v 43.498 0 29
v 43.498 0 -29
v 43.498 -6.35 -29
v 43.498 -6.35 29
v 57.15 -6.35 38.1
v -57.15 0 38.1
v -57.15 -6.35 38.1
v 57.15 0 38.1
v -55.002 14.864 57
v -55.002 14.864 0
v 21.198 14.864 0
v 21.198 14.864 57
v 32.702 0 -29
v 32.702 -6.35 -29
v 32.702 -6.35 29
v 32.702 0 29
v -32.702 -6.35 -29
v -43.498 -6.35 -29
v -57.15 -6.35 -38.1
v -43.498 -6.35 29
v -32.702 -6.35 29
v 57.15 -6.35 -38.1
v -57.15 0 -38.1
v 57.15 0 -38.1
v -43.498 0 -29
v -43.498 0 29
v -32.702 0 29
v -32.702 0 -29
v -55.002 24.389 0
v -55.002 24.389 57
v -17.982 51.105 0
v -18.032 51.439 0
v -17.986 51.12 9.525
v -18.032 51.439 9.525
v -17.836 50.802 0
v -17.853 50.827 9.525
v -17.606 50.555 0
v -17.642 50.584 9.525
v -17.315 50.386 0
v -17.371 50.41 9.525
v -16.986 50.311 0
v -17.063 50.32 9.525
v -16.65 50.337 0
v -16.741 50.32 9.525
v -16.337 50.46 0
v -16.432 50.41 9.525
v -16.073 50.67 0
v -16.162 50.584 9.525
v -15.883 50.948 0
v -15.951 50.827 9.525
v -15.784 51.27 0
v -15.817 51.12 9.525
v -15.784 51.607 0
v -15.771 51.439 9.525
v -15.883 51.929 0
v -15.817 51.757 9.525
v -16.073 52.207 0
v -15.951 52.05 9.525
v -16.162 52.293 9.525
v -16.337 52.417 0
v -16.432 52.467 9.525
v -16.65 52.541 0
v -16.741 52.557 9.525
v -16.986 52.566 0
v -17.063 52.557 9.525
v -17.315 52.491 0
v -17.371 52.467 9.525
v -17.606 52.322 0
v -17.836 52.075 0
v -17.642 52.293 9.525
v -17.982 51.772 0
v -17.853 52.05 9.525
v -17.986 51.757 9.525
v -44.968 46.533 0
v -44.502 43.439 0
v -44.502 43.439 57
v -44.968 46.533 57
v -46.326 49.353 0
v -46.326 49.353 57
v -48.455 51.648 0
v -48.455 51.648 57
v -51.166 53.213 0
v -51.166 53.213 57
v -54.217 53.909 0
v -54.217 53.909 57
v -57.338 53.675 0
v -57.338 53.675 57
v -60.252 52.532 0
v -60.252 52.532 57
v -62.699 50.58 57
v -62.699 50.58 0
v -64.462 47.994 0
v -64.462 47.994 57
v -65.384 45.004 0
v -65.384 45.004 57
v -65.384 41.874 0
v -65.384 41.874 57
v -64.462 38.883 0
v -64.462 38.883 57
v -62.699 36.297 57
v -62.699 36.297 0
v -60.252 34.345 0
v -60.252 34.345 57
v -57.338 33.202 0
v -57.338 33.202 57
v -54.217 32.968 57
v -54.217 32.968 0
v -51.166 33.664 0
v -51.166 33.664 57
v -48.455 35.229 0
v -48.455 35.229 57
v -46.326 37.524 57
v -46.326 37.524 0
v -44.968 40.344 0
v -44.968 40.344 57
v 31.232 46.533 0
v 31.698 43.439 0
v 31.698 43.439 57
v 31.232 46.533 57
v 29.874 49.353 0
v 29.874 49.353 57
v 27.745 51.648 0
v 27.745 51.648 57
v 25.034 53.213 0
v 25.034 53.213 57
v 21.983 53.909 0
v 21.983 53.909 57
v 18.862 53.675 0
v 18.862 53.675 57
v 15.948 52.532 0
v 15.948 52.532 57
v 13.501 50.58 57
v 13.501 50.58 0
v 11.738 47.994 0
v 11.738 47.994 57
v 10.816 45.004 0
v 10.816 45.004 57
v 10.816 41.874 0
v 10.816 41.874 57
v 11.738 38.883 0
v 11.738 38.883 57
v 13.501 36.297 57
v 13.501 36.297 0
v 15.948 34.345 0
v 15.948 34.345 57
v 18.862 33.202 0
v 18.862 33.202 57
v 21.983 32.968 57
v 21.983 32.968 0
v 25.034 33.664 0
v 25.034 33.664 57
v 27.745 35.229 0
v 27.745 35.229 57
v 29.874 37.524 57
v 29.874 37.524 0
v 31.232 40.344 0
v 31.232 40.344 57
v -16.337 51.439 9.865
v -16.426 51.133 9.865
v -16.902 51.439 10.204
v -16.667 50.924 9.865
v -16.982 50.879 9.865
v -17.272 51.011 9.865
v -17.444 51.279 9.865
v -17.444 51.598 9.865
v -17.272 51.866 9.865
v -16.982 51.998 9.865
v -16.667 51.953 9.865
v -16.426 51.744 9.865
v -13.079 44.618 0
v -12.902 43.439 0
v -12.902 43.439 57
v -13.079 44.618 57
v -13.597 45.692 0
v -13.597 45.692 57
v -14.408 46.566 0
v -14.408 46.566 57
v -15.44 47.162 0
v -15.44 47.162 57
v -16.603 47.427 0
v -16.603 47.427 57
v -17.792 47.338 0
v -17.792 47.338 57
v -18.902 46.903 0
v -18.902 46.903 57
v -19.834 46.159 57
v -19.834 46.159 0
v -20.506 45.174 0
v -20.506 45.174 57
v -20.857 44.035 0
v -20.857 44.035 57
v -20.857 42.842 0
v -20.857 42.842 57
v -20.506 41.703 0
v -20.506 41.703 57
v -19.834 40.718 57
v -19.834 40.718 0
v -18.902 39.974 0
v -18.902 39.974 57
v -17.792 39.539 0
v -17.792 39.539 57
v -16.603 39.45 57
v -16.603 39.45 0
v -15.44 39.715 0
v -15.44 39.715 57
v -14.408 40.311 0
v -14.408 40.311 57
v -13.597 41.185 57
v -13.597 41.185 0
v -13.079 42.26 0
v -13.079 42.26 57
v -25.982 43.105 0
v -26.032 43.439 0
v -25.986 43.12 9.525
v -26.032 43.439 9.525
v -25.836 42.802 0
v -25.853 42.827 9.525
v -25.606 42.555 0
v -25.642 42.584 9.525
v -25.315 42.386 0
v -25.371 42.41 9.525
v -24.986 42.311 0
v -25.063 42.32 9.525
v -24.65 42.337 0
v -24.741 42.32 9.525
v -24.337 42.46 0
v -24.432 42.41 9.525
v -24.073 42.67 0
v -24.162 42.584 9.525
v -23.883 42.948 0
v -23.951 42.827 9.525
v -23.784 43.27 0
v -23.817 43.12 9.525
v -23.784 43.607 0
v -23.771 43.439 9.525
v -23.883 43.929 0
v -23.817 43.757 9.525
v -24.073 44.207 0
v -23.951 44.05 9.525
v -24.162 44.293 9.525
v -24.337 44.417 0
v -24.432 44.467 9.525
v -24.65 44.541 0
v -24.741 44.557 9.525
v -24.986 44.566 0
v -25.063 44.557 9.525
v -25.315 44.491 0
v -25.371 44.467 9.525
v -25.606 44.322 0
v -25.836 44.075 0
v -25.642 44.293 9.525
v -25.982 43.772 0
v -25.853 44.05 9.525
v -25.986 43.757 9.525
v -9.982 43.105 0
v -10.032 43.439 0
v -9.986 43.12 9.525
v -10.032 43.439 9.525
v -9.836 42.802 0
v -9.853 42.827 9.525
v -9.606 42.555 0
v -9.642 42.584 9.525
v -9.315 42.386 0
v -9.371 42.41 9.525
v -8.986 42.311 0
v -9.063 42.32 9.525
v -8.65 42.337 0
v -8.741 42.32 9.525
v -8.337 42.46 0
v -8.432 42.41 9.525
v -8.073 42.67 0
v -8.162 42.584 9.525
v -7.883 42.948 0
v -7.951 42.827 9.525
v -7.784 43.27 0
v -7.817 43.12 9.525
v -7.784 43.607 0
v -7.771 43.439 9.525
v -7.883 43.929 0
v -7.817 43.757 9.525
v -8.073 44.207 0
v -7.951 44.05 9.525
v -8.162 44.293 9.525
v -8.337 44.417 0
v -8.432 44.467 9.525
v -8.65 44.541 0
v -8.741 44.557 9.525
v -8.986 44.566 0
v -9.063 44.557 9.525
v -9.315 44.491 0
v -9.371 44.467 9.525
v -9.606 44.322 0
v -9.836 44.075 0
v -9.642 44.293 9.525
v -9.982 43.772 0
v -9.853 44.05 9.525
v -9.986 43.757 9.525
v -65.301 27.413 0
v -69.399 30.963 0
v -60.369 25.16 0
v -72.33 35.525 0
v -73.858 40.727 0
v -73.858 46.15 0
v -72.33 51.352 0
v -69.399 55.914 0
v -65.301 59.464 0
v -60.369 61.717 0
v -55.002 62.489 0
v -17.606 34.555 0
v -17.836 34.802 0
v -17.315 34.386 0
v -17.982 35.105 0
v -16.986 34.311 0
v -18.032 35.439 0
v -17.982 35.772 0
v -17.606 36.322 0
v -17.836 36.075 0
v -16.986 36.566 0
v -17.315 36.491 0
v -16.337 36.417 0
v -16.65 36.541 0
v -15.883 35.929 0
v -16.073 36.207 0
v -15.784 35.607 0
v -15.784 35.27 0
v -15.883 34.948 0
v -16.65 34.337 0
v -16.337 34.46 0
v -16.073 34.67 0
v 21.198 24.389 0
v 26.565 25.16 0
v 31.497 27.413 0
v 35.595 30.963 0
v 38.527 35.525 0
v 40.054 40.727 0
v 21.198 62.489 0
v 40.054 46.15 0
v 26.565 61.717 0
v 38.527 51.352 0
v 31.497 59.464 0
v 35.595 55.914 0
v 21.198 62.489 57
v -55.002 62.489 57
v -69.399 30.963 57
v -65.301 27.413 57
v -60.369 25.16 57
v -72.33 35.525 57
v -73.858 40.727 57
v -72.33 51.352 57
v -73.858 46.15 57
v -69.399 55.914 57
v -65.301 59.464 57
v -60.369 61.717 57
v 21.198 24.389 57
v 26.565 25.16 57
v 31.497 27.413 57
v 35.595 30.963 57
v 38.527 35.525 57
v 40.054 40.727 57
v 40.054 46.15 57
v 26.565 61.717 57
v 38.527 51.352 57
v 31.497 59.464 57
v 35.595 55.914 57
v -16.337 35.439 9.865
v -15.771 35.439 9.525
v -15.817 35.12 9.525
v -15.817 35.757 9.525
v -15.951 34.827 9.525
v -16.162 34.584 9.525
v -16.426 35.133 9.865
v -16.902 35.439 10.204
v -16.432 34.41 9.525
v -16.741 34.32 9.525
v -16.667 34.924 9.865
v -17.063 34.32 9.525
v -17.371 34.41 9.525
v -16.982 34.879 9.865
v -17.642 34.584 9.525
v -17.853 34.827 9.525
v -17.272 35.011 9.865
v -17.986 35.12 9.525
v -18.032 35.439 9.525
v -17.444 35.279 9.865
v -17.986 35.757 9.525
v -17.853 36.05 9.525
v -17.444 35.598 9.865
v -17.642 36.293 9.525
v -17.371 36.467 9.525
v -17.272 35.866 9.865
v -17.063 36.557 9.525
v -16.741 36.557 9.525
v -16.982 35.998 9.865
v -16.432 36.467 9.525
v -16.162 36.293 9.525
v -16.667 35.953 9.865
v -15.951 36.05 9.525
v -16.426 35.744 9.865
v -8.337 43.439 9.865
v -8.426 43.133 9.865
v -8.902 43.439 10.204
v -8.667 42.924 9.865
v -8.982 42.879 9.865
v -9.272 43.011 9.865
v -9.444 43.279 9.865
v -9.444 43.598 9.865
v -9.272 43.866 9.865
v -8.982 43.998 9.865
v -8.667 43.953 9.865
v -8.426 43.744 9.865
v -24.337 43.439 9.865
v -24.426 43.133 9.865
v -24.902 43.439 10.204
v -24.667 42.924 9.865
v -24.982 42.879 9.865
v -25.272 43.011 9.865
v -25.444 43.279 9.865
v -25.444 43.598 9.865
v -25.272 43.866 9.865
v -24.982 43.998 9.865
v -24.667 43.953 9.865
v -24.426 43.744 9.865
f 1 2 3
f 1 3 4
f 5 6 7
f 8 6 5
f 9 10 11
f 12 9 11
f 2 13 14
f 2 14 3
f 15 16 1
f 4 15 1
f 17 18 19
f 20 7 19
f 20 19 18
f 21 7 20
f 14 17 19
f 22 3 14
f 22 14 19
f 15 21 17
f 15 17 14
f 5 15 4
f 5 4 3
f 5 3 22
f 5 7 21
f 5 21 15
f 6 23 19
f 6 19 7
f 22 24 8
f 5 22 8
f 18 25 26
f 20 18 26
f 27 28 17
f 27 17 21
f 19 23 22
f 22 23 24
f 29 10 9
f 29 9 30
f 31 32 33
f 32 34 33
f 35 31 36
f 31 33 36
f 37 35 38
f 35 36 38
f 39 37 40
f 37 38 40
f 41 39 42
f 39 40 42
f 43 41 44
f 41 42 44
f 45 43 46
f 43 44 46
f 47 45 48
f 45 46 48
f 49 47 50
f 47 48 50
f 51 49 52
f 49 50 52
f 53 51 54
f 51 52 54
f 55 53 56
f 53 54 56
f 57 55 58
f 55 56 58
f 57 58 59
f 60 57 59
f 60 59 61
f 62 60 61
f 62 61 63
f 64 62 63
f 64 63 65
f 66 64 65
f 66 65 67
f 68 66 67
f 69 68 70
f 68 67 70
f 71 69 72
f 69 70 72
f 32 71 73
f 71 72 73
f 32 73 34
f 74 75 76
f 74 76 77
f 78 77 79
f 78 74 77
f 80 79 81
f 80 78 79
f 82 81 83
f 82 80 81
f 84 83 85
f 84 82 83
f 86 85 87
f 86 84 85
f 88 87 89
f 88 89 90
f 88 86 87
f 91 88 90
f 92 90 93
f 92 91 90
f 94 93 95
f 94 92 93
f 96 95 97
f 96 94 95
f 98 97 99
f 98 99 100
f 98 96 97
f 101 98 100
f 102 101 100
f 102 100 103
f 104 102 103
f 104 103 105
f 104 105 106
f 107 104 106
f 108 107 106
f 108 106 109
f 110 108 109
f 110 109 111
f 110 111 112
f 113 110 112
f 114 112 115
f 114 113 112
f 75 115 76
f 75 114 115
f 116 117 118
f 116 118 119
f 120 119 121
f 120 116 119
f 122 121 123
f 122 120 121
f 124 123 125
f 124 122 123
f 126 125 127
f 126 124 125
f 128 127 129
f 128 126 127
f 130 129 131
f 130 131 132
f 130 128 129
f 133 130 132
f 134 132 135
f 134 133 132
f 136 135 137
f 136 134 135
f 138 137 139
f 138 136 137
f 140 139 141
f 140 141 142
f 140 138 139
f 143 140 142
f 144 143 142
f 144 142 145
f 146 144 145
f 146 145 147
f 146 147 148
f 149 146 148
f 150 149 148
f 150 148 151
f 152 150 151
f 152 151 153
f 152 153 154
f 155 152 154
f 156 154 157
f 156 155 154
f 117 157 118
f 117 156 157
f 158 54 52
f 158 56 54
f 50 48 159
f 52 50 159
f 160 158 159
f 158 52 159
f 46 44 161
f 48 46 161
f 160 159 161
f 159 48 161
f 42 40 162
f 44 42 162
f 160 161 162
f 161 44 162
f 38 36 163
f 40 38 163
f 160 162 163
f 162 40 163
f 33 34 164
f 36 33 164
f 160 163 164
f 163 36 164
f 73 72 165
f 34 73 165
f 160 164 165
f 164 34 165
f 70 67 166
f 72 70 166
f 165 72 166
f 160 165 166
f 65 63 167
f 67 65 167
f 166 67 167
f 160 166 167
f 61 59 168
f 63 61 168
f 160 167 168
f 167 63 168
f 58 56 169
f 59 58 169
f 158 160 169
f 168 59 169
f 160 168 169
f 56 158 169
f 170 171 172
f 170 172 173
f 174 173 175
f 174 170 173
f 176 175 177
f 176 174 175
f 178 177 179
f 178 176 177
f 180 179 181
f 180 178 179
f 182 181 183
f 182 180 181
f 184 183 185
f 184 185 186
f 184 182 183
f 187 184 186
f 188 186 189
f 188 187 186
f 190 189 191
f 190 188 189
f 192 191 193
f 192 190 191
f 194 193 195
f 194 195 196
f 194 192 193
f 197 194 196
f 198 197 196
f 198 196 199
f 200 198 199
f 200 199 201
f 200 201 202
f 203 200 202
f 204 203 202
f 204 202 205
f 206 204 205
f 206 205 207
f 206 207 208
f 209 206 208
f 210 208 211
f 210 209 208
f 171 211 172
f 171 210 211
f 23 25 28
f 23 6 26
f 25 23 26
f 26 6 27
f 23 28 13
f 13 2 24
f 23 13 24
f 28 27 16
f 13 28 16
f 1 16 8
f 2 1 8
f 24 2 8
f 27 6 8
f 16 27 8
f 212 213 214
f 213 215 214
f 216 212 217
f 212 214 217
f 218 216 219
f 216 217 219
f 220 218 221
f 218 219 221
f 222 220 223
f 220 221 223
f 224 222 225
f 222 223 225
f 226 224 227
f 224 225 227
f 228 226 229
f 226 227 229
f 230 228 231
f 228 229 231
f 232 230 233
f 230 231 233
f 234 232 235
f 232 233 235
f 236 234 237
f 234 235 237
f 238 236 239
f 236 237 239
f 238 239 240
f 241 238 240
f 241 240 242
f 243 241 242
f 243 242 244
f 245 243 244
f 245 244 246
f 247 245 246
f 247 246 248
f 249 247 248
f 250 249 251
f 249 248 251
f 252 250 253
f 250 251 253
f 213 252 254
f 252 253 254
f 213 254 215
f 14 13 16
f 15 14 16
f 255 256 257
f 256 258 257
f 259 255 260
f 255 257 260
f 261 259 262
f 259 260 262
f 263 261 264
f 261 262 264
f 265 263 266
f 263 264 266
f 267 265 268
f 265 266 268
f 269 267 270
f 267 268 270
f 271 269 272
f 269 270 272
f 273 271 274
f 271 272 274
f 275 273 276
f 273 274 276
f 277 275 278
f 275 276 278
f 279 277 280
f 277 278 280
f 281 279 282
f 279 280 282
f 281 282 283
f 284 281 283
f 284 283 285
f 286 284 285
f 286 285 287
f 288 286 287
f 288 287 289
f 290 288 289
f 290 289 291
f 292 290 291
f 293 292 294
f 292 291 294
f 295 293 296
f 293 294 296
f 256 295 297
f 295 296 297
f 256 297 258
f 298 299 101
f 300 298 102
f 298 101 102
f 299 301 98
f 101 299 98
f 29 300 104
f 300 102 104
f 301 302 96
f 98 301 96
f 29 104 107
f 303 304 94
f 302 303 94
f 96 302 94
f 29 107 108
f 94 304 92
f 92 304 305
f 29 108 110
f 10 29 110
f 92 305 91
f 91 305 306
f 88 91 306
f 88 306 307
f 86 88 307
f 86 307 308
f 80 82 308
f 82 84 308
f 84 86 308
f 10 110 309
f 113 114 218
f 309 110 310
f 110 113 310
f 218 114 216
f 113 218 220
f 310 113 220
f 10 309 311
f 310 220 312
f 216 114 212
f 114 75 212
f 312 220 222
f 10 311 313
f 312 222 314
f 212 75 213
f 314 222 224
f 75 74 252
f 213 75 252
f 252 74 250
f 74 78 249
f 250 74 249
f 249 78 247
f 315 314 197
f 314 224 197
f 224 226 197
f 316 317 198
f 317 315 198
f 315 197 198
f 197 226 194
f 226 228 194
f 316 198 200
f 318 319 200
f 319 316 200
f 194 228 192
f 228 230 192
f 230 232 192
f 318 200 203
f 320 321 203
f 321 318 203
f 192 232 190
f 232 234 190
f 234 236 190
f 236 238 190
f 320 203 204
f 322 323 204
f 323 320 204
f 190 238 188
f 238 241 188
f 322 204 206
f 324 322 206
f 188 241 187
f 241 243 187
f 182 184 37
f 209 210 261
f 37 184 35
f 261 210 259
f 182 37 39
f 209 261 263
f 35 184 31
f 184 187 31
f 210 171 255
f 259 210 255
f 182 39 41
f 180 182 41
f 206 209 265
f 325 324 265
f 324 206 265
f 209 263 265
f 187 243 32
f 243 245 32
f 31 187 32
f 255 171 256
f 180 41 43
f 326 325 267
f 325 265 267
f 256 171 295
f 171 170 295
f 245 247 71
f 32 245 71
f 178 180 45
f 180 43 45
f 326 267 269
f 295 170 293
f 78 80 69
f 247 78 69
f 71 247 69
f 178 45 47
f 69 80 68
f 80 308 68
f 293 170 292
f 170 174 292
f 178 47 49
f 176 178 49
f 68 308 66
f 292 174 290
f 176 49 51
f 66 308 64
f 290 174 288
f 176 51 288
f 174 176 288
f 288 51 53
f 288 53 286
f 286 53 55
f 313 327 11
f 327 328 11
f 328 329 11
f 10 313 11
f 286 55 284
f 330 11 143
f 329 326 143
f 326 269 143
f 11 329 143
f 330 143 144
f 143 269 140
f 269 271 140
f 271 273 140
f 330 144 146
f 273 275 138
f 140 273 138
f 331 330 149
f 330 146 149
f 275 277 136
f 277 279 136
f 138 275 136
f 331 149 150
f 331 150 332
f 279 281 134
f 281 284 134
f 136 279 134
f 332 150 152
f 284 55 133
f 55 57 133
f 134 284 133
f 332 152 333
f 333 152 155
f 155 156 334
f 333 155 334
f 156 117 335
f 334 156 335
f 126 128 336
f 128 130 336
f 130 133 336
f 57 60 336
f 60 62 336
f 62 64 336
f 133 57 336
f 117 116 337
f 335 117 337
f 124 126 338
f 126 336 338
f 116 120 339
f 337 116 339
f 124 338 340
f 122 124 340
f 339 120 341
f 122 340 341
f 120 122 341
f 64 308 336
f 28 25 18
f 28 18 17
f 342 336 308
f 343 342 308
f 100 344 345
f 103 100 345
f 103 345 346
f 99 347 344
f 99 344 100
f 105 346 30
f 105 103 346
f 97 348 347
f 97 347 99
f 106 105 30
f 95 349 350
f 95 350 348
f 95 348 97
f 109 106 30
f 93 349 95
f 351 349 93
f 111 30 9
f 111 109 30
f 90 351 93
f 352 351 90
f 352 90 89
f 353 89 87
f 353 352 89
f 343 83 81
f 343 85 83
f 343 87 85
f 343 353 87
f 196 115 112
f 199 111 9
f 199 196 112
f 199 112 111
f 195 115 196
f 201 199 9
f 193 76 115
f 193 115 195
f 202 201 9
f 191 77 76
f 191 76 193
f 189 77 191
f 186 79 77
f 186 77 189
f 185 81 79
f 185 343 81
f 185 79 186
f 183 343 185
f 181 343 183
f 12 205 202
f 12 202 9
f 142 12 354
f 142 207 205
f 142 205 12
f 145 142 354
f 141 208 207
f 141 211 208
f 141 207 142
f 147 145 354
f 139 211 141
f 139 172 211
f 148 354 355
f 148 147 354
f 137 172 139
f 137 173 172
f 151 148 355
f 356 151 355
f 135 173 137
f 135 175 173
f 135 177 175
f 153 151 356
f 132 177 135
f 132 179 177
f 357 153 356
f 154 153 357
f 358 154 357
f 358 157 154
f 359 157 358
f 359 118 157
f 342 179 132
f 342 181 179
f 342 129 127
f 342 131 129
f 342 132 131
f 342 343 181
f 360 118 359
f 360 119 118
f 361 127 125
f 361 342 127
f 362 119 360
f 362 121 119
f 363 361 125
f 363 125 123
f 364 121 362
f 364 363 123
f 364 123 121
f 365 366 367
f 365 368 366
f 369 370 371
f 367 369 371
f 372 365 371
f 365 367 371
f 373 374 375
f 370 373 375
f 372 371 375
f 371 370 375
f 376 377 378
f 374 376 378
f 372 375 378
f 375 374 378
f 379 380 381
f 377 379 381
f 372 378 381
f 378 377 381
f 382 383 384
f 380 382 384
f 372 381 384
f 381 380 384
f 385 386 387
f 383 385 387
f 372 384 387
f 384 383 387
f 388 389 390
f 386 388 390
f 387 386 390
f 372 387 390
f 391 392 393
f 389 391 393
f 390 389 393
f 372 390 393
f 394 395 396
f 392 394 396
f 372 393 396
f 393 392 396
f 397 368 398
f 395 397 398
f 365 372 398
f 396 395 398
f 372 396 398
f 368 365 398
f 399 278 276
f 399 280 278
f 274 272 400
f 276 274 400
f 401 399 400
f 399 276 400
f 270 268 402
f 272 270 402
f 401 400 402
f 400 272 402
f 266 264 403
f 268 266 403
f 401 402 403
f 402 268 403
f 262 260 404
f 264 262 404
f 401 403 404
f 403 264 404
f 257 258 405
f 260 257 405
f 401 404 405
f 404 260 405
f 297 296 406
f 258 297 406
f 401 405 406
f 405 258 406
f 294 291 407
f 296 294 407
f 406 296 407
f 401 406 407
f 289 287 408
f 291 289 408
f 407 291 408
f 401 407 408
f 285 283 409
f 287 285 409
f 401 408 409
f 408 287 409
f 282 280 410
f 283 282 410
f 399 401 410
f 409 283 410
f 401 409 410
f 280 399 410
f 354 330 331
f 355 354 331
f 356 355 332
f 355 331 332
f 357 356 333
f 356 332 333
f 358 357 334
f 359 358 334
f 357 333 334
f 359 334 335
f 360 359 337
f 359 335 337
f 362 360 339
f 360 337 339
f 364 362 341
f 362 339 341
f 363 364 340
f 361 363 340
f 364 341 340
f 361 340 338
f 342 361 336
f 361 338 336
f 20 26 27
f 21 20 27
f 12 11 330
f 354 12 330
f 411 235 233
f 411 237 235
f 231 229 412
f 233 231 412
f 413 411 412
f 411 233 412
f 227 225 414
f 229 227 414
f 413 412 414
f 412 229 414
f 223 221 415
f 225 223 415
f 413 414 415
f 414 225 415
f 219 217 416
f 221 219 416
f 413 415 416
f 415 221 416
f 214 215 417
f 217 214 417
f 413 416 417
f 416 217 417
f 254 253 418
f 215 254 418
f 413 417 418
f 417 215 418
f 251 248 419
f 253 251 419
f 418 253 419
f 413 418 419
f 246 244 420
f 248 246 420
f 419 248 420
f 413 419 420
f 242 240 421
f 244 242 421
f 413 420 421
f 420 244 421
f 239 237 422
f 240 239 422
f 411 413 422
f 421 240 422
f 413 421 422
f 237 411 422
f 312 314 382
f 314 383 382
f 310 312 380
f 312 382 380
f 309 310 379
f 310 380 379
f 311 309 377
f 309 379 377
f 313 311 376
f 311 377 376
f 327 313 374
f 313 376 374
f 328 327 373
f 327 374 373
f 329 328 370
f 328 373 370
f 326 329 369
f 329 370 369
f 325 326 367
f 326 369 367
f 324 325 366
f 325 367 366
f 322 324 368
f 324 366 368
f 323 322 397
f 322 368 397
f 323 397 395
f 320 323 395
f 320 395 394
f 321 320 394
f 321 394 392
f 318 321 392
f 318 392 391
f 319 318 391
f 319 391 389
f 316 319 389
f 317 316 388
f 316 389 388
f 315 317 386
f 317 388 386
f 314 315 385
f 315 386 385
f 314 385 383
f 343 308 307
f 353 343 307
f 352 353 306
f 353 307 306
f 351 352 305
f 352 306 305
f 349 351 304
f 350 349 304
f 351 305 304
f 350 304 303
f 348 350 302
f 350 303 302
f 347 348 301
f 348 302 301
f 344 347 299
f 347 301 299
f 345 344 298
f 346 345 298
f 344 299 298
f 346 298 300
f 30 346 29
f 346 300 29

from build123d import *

# Parameters (mm, degrees)
F0_W     = 114.3
F0_H     = 76.2
F0_W_2   = 10.795
F0_H_2   = 58
F1_DEPTH = 6.35
F2_R     = 10.5
F2_R_2   = 4
F2_W     = 76.2
F2_H     = 9.525
F3_DEPTH = 57
F5_D     = 2.2606
F5_DEPTH = 9.525
F5_TIP   = 0.6791527577


with BuildPart() as f1:
    # F0 (on Front) → F1 (new body)
    with BuildSketch(Plane.XZ):
        Rectangle(F0_W, F0_H)
        with Locations((-38.1, 0)):
            Rectangle(F0_W_2, F0_H_2, mode=Mode.SUBTRACT)
        with Locations((38.1, 0)):
            Rectangle(F0_W_2, F0_H_2, mode=Mode.SUBTRACT)
    extrude(amount=F1_DEPTH)


with BuildPart() as f3:
    # F2 (on Top) → F3 (new body)
    with BuildSketch(Plane.XY):
        with BuildLine():
            ThreePointArc((-55.0017617643, 62.4885612607), (-74.0517617643, 43.4385612607), (-55.0017617643, 24.3885612607))
            Line((-55.0017617643, 24.3885612607), (21.1982382357, 24.3885612607))
            ThreePointArc((21.1982382357, 24.3885612607), (40.2482382357, 43.4385612607), (21.1982382357, 62.4885612607))
            Line((21.1982382357, 62.4885612607), (-55.0017617643, 62.4885612607))
        make_face()
        with Locations((-55.0017617643, 43.4385612607)):
            Circle(F2_R, mode=Mode.SUBTRACT)
        with Locations((-16.9017617643, 43.4385612607)):
            Circle(F2_R_2, mode=Mode.SUBTRACT)
        with Locations((21.1982382357, 43.4385612607)):
            Circle(F2_R, mode=Mode.SUBTRACT)
        with Locations((-16.9017617643, 19.6260612607)):
            Rectangle(F2_W, F2_H)
    extrude(amount=F3_DEPTH)

    # F5
    with Locations(Plane(origin=(0, 0, 0), x_dir=(1, 0, 0), z_dir=(0, 0, -1))):
        with Locations((-24.9017617643, -43.4385612607), (-16.9017617643, -35.4385612607), (-8.9017617643, -43.4385612607), (-16.9017617643, -51.4385612607)):
            Hole(F5_D / 2, depth=F5_DEPTH)
            with Locations((0, 0, -(F5_DEPTH + F5_TIP / 2))):  # 118° drill point
                Cone(0, F5_D / 2, F5_TIP, mode=Mode.SUBTRACT)


solid = Compound([f1.part, f3.part])
